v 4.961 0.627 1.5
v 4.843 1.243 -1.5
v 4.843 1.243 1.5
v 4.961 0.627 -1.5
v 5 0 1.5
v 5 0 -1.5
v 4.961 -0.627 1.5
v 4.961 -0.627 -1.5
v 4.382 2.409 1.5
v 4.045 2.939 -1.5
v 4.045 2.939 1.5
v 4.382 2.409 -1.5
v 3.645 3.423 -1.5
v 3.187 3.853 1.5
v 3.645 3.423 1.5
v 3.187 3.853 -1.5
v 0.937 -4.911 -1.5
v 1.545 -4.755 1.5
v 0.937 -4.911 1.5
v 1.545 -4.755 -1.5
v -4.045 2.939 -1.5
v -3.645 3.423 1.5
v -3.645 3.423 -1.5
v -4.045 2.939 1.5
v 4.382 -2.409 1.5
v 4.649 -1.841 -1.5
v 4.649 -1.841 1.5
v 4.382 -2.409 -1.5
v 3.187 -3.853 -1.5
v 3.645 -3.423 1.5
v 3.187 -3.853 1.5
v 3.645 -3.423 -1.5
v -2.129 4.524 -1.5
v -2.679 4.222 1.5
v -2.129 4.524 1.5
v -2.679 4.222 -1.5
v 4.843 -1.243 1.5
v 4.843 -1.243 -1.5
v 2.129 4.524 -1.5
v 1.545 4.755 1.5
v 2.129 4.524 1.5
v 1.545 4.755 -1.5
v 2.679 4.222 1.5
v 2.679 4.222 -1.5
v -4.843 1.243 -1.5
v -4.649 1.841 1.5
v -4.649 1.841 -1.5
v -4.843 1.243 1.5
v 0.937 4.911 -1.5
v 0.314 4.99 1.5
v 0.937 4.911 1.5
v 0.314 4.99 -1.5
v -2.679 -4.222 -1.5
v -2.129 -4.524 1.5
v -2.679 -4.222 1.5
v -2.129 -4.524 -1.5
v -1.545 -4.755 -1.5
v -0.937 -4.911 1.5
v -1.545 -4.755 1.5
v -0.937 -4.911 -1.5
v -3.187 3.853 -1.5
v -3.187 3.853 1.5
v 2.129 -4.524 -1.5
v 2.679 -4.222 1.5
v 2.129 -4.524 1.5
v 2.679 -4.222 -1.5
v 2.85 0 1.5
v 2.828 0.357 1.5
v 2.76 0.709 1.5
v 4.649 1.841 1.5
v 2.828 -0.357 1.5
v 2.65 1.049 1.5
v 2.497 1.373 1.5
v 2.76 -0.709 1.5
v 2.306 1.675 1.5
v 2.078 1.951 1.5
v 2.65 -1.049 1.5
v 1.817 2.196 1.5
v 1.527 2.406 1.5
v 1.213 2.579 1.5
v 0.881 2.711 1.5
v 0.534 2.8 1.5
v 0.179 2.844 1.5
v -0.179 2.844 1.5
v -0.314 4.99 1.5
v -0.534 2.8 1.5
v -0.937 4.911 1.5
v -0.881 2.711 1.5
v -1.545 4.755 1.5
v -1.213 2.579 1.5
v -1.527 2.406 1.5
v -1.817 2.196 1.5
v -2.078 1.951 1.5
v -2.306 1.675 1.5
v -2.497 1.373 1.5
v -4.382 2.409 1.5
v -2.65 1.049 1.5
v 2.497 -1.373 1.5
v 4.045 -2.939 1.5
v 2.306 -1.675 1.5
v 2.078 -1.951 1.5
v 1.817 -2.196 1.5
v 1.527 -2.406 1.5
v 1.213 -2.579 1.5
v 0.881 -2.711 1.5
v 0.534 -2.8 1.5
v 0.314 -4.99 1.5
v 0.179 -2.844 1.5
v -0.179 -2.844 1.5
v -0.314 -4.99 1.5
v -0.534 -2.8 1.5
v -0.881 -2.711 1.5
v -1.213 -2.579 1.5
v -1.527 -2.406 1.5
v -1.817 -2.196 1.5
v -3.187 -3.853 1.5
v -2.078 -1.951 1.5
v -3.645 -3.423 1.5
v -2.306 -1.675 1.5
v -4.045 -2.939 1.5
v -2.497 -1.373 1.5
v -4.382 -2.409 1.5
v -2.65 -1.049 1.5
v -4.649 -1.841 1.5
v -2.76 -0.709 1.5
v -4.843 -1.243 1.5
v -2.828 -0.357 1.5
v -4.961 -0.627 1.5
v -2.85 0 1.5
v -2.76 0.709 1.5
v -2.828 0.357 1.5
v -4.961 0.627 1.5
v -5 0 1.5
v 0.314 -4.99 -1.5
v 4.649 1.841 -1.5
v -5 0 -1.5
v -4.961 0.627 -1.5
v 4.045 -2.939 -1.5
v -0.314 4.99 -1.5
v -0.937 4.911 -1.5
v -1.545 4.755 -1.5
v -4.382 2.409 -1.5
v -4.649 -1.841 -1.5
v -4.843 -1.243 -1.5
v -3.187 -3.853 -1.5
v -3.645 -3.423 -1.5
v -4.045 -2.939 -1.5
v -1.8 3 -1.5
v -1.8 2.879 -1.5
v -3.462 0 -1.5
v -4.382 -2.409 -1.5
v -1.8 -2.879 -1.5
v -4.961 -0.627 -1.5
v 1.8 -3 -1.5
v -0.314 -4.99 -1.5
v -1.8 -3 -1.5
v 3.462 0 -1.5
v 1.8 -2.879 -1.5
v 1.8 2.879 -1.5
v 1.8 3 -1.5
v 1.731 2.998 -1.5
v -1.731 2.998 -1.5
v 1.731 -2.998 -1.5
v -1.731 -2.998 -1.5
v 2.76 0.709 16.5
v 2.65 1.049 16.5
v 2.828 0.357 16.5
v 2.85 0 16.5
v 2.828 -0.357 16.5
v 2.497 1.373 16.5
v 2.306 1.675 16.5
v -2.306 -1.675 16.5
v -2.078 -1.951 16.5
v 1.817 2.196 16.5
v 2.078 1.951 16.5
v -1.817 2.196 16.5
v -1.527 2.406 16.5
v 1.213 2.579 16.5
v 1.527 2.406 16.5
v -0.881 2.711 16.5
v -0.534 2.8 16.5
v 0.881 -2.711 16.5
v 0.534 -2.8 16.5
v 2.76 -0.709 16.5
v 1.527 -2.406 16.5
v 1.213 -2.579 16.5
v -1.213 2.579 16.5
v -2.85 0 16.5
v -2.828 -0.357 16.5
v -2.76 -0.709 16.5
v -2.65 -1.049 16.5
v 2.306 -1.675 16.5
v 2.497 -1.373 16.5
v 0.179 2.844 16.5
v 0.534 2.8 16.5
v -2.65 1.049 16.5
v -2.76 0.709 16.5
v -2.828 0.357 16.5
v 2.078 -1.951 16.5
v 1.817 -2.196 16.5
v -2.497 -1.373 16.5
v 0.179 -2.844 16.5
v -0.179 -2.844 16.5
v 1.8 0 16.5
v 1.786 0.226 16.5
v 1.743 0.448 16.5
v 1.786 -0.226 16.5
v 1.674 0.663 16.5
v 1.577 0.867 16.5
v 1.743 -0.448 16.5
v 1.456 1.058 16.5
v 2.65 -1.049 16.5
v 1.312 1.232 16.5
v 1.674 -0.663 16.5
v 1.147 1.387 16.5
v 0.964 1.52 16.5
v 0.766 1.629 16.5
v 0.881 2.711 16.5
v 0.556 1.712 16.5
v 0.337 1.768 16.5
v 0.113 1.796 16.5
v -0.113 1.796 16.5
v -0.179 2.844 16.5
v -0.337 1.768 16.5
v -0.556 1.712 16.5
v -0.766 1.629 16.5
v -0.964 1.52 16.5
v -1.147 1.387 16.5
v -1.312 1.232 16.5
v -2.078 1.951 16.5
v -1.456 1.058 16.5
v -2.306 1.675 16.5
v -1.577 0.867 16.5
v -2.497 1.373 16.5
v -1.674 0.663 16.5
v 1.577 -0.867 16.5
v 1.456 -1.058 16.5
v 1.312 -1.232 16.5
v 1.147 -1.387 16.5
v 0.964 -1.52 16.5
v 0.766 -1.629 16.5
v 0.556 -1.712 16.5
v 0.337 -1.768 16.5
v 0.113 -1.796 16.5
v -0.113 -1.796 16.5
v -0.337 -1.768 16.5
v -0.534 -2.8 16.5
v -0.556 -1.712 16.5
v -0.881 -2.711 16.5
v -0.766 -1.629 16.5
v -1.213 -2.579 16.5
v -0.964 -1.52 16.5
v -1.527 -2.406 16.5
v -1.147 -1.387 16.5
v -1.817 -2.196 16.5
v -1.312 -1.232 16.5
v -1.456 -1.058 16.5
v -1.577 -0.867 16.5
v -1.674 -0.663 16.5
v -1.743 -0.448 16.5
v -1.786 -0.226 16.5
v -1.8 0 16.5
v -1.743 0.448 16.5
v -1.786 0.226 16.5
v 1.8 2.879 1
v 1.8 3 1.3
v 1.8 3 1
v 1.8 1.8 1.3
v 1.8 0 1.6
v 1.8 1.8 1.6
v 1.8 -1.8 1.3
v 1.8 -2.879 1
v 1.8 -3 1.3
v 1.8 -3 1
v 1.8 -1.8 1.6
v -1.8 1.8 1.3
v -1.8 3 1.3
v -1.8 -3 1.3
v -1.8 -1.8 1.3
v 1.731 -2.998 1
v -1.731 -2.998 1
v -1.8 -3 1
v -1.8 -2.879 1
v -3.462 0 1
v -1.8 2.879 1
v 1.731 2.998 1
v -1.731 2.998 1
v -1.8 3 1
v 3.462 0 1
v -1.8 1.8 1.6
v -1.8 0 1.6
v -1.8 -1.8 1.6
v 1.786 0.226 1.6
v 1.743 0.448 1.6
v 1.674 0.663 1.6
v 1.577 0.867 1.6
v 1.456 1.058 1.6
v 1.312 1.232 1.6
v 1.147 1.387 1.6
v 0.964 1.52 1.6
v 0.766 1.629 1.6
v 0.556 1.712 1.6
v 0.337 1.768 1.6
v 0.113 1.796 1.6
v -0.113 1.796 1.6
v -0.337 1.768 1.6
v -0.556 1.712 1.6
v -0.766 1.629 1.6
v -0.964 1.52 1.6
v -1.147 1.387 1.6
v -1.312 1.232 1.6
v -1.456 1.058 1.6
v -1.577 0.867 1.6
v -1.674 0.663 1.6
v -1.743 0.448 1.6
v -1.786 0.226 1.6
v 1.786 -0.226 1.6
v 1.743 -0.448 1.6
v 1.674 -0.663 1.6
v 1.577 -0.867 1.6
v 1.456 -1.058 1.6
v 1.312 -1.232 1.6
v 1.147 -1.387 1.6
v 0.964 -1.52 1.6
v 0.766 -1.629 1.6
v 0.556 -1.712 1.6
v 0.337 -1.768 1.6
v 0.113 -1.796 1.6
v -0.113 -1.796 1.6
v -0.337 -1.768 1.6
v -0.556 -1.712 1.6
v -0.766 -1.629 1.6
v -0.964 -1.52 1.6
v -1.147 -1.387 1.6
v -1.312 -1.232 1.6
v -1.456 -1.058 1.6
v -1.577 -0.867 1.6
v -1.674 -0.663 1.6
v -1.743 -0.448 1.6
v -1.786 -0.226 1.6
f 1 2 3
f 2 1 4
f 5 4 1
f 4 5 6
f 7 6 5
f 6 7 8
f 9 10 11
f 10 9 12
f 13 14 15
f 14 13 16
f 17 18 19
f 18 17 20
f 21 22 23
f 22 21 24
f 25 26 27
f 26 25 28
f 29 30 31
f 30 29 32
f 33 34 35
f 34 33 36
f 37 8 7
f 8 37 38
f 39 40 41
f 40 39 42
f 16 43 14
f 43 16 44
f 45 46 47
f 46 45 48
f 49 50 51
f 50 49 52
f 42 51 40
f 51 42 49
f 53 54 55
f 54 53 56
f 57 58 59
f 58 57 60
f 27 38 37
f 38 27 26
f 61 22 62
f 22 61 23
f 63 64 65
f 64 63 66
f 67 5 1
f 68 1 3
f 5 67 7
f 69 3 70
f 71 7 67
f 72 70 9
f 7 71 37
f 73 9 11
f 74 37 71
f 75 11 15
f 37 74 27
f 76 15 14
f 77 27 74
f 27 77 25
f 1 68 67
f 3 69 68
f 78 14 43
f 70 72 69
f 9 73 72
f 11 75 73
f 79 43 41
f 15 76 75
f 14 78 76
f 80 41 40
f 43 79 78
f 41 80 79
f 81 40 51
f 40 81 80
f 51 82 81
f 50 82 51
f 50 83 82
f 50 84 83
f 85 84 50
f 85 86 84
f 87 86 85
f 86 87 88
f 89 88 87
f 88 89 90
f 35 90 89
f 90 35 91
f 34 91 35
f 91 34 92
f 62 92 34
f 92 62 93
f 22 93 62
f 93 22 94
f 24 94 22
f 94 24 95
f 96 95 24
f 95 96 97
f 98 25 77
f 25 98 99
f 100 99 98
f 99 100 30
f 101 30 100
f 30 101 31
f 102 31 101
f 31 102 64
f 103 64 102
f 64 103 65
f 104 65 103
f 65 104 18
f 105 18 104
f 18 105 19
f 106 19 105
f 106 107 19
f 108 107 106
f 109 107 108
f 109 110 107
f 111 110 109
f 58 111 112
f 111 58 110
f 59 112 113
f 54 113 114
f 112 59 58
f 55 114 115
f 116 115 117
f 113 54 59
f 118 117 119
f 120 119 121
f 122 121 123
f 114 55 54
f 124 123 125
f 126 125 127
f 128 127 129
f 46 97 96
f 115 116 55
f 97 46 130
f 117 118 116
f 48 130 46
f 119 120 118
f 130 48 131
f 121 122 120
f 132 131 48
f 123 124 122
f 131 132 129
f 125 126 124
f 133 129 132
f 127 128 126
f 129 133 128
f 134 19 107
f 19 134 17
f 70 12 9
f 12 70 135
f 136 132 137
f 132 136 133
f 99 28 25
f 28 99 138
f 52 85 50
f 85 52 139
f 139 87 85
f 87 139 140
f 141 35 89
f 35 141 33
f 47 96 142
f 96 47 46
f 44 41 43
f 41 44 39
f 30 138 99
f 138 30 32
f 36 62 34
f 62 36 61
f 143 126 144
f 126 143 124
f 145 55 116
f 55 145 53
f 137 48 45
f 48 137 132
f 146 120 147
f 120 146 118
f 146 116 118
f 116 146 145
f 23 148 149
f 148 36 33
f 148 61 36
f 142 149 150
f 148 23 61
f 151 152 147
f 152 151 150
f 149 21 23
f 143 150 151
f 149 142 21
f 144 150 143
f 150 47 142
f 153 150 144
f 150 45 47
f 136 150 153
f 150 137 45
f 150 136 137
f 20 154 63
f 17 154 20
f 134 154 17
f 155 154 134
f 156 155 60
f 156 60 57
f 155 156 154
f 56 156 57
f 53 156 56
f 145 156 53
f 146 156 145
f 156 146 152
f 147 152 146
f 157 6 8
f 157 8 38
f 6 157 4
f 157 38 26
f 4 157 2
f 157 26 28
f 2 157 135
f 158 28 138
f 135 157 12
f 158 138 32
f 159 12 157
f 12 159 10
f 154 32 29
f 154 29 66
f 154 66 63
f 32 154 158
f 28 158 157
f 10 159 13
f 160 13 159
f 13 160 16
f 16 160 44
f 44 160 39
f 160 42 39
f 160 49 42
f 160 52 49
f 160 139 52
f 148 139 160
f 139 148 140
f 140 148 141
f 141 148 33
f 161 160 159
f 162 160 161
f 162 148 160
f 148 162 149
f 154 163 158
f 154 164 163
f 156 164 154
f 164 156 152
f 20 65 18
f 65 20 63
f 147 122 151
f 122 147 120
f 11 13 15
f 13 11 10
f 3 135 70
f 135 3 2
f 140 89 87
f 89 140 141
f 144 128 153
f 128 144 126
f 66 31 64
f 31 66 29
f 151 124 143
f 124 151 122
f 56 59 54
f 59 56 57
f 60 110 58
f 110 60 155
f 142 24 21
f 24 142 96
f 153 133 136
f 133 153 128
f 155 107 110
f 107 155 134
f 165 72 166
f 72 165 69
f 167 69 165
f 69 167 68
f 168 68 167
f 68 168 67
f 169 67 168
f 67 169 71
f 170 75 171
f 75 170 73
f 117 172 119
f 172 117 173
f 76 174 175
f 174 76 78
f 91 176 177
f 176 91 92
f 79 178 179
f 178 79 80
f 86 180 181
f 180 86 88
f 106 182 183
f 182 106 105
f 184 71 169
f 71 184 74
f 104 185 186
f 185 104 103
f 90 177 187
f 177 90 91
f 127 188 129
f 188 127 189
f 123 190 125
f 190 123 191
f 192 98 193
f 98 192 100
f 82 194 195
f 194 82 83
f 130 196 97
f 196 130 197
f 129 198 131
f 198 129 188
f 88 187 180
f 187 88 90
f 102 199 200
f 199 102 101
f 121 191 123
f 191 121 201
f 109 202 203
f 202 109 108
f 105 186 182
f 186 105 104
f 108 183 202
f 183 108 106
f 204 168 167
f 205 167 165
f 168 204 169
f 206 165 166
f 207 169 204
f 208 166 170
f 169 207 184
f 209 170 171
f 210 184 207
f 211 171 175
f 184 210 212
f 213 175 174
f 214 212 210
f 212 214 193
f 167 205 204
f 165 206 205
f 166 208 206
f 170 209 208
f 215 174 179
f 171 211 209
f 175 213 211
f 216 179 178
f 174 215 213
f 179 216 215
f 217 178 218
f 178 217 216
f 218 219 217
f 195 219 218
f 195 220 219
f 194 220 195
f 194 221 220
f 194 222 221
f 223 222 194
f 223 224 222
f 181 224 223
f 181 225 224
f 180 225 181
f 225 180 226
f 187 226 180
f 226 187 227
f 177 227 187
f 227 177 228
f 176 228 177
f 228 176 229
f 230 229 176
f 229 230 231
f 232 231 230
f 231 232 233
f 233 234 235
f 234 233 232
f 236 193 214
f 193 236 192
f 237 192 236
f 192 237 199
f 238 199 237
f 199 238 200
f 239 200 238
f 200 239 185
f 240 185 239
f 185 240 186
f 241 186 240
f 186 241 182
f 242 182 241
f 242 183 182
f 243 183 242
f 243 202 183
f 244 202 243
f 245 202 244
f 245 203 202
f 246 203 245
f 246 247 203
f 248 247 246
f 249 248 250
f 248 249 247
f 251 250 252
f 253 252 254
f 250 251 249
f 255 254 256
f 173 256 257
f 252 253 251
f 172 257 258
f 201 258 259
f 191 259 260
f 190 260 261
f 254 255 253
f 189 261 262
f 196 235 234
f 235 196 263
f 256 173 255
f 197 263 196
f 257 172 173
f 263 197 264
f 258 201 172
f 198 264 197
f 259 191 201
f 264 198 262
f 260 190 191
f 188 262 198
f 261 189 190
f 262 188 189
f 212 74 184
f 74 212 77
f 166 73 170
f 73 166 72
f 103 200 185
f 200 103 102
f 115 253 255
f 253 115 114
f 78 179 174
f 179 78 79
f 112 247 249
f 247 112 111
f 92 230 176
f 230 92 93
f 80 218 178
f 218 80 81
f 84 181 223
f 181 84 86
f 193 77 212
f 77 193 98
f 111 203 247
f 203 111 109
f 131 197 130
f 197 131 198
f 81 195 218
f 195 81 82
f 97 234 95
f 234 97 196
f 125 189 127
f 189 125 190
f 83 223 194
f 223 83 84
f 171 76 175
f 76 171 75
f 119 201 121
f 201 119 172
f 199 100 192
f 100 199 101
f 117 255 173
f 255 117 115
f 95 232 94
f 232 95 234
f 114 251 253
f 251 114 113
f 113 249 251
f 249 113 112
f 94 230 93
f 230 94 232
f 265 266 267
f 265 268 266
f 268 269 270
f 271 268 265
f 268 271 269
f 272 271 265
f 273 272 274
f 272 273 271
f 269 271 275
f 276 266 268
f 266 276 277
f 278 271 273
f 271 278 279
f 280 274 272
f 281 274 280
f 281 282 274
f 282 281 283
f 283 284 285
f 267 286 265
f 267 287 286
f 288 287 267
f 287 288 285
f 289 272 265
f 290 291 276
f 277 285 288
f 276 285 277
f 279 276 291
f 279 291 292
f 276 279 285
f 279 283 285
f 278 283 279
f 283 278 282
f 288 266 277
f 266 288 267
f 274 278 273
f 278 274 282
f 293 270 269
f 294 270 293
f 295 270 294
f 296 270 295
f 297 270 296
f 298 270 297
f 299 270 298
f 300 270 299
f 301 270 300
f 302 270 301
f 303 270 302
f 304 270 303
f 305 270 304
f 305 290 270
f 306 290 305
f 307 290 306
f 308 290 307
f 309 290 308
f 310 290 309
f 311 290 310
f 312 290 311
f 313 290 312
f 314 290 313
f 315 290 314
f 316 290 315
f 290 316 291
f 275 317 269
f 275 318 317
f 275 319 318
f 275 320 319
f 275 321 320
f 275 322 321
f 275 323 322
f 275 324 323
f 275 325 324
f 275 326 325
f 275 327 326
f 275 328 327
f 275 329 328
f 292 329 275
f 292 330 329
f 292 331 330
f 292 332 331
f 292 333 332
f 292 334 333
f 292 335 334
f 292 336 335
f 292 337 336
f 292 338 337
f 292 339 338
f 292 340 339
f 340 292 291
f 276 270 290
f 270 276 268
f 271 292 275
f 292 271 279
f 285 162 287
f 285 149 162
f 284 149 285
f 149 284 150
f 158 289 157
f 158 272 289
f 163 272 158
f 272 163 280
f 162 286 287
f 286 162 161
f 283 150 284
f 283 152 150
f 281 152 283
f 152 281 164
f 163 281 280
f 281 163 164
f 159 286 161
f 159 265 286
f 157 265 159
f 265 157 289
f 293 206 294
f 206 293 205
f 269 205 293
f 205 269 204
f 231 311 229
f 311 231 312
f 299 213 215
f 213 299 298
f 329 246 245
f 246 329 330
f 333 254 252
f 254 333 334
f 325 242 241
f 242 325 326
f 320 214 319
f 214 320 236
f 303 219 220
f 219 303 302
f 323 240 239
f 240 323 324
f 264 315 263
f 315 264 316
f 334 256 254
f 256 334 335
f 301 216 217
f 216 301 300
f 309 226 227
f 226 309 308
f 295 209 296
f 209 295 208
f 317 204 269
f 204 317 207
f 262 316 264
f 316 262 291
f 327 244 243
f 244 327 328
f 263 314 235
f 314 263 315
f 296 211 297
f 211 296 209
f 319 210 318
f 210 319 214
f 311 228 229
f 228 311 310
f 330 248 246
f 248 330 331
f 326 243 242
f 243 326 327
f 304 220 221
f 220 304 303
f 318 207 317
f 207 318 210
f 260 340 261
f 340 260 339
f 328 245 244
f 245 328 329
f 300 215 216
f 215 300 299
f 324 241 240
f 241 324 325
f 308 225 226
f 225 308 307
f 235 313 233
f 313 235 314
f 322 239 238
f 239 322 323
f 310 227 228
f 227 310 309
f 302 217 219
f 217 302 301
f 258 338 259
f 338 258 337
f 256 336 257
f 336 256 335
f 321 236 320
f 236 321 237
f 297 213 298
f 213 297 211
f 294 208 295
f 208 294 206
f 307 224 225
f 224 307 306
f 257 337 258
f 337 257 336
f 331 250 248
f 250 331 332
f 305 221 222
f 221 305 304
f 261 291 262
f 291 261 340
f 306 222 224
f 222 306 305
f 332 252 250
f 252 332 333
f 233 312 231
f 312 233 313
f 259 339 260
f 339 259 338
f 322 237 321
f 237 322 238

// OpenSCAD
$fn = 50;


difference() {
	union() {
		translate(v = [0, 0, -1.5000000000]) {
			cylinder(h = 3, r = 5.0000000000);
		}
		translate(v = [0, 0, -1.5000000000]) {
			cylinder(h = 18, r = 2.8500000000);
		}
	}
	union() {
		translate(v = [0, 0, -1.5000000000]) {
			rotate(a = [0, 0, 0]) {
				difference() {
					union() {
						translate(v = [-1.8000000000, -3.0000000000, -0.3000000000]) {
							cube(size = [3.6000000000, 6.0000000000, 0.3000000000]);
						}
						translate(v = [-1.8000000000, -1.8000000000, -0.6000000000]) {
							cube(size = [3.6000000000, 3.6000000000, 0.3000000000]);
						}
						translate(v = [-1.8000000000, -3.0000000000, 2.5000000000]) {
							cube(size = [3.6000000000, 6.0000000000, 0.3000000000]);
						}
						translate(v = [-1.8000000000, -1.8000000000, 2.8000000000]) {
							cube(size = [3.6000000000, 3.6000000000, 0.3000000000]);
						}
						linear_extrude(height = 2.5000000000) {
							polygon(points = [[3.4620000000, 0.0000000000], [1.7310000000, 2.9981799479], [-1.7310000000, 2.9981799479], [-3.4620000000, 0.0000000000], [-1.7310000000, -2.9981799479], [1.7310000000, -2.9981799479]]);
						}
						translate(v = [-1.8000000000, -3.0000000000, -0.3000000000]) {
							cube(size = [3.6000000000, 6.0000000000, 0.3000000000]);
						}
						translate(v = [-1.8000000000, -1.8000000000, -0.6000000000]) {
							cube(size = [3.6000000000, 3.6000000000, 0.3000000000]);
						}
						translate(v = [-1.8000000000, -3.0000000000, 2.5000000000]) {
							cube(size = [3.6000000000, 6.0000000000, 0.3000000000]);
						}
						translate(v = [-1.8000000000, -1.8000000000, 2.8000000000]) {
							cube(size = [3.6000000000, 3.6000000000, 0.3000000000]);
						}
						translate(v = [-1.8000000000, -3.0000000000, -0.3000000000]) {
							cube(size = [3.6000000000, 6.0000000000, 0.3000000000]);
						}
						translate(v = [-1.8000000000, -1.8000000000, -0.6000000000]) {
							cube(size = [3.6000000000, 3.6000000000, 0.3000000000]);
						}
						translate(v = [-1.8000000000, -3.0000000000, 2.5000000000]) {
							cube(size = [3.6000000000, 6.0000000000, 0.3000000000]);
						}
						translate(v = [-1.8000000000, -1.8000000000, 2.8000000000]) {
							cube(size = [3.6000000000, 3.6000000000, 0.3000000000]);
						}
					}
					union();
				}
			}
		}
		translate(v = [0, 0, -50.0000000000]) {
			cylinder(h = 100, r = 1.8000000000);
		}
	}
}
